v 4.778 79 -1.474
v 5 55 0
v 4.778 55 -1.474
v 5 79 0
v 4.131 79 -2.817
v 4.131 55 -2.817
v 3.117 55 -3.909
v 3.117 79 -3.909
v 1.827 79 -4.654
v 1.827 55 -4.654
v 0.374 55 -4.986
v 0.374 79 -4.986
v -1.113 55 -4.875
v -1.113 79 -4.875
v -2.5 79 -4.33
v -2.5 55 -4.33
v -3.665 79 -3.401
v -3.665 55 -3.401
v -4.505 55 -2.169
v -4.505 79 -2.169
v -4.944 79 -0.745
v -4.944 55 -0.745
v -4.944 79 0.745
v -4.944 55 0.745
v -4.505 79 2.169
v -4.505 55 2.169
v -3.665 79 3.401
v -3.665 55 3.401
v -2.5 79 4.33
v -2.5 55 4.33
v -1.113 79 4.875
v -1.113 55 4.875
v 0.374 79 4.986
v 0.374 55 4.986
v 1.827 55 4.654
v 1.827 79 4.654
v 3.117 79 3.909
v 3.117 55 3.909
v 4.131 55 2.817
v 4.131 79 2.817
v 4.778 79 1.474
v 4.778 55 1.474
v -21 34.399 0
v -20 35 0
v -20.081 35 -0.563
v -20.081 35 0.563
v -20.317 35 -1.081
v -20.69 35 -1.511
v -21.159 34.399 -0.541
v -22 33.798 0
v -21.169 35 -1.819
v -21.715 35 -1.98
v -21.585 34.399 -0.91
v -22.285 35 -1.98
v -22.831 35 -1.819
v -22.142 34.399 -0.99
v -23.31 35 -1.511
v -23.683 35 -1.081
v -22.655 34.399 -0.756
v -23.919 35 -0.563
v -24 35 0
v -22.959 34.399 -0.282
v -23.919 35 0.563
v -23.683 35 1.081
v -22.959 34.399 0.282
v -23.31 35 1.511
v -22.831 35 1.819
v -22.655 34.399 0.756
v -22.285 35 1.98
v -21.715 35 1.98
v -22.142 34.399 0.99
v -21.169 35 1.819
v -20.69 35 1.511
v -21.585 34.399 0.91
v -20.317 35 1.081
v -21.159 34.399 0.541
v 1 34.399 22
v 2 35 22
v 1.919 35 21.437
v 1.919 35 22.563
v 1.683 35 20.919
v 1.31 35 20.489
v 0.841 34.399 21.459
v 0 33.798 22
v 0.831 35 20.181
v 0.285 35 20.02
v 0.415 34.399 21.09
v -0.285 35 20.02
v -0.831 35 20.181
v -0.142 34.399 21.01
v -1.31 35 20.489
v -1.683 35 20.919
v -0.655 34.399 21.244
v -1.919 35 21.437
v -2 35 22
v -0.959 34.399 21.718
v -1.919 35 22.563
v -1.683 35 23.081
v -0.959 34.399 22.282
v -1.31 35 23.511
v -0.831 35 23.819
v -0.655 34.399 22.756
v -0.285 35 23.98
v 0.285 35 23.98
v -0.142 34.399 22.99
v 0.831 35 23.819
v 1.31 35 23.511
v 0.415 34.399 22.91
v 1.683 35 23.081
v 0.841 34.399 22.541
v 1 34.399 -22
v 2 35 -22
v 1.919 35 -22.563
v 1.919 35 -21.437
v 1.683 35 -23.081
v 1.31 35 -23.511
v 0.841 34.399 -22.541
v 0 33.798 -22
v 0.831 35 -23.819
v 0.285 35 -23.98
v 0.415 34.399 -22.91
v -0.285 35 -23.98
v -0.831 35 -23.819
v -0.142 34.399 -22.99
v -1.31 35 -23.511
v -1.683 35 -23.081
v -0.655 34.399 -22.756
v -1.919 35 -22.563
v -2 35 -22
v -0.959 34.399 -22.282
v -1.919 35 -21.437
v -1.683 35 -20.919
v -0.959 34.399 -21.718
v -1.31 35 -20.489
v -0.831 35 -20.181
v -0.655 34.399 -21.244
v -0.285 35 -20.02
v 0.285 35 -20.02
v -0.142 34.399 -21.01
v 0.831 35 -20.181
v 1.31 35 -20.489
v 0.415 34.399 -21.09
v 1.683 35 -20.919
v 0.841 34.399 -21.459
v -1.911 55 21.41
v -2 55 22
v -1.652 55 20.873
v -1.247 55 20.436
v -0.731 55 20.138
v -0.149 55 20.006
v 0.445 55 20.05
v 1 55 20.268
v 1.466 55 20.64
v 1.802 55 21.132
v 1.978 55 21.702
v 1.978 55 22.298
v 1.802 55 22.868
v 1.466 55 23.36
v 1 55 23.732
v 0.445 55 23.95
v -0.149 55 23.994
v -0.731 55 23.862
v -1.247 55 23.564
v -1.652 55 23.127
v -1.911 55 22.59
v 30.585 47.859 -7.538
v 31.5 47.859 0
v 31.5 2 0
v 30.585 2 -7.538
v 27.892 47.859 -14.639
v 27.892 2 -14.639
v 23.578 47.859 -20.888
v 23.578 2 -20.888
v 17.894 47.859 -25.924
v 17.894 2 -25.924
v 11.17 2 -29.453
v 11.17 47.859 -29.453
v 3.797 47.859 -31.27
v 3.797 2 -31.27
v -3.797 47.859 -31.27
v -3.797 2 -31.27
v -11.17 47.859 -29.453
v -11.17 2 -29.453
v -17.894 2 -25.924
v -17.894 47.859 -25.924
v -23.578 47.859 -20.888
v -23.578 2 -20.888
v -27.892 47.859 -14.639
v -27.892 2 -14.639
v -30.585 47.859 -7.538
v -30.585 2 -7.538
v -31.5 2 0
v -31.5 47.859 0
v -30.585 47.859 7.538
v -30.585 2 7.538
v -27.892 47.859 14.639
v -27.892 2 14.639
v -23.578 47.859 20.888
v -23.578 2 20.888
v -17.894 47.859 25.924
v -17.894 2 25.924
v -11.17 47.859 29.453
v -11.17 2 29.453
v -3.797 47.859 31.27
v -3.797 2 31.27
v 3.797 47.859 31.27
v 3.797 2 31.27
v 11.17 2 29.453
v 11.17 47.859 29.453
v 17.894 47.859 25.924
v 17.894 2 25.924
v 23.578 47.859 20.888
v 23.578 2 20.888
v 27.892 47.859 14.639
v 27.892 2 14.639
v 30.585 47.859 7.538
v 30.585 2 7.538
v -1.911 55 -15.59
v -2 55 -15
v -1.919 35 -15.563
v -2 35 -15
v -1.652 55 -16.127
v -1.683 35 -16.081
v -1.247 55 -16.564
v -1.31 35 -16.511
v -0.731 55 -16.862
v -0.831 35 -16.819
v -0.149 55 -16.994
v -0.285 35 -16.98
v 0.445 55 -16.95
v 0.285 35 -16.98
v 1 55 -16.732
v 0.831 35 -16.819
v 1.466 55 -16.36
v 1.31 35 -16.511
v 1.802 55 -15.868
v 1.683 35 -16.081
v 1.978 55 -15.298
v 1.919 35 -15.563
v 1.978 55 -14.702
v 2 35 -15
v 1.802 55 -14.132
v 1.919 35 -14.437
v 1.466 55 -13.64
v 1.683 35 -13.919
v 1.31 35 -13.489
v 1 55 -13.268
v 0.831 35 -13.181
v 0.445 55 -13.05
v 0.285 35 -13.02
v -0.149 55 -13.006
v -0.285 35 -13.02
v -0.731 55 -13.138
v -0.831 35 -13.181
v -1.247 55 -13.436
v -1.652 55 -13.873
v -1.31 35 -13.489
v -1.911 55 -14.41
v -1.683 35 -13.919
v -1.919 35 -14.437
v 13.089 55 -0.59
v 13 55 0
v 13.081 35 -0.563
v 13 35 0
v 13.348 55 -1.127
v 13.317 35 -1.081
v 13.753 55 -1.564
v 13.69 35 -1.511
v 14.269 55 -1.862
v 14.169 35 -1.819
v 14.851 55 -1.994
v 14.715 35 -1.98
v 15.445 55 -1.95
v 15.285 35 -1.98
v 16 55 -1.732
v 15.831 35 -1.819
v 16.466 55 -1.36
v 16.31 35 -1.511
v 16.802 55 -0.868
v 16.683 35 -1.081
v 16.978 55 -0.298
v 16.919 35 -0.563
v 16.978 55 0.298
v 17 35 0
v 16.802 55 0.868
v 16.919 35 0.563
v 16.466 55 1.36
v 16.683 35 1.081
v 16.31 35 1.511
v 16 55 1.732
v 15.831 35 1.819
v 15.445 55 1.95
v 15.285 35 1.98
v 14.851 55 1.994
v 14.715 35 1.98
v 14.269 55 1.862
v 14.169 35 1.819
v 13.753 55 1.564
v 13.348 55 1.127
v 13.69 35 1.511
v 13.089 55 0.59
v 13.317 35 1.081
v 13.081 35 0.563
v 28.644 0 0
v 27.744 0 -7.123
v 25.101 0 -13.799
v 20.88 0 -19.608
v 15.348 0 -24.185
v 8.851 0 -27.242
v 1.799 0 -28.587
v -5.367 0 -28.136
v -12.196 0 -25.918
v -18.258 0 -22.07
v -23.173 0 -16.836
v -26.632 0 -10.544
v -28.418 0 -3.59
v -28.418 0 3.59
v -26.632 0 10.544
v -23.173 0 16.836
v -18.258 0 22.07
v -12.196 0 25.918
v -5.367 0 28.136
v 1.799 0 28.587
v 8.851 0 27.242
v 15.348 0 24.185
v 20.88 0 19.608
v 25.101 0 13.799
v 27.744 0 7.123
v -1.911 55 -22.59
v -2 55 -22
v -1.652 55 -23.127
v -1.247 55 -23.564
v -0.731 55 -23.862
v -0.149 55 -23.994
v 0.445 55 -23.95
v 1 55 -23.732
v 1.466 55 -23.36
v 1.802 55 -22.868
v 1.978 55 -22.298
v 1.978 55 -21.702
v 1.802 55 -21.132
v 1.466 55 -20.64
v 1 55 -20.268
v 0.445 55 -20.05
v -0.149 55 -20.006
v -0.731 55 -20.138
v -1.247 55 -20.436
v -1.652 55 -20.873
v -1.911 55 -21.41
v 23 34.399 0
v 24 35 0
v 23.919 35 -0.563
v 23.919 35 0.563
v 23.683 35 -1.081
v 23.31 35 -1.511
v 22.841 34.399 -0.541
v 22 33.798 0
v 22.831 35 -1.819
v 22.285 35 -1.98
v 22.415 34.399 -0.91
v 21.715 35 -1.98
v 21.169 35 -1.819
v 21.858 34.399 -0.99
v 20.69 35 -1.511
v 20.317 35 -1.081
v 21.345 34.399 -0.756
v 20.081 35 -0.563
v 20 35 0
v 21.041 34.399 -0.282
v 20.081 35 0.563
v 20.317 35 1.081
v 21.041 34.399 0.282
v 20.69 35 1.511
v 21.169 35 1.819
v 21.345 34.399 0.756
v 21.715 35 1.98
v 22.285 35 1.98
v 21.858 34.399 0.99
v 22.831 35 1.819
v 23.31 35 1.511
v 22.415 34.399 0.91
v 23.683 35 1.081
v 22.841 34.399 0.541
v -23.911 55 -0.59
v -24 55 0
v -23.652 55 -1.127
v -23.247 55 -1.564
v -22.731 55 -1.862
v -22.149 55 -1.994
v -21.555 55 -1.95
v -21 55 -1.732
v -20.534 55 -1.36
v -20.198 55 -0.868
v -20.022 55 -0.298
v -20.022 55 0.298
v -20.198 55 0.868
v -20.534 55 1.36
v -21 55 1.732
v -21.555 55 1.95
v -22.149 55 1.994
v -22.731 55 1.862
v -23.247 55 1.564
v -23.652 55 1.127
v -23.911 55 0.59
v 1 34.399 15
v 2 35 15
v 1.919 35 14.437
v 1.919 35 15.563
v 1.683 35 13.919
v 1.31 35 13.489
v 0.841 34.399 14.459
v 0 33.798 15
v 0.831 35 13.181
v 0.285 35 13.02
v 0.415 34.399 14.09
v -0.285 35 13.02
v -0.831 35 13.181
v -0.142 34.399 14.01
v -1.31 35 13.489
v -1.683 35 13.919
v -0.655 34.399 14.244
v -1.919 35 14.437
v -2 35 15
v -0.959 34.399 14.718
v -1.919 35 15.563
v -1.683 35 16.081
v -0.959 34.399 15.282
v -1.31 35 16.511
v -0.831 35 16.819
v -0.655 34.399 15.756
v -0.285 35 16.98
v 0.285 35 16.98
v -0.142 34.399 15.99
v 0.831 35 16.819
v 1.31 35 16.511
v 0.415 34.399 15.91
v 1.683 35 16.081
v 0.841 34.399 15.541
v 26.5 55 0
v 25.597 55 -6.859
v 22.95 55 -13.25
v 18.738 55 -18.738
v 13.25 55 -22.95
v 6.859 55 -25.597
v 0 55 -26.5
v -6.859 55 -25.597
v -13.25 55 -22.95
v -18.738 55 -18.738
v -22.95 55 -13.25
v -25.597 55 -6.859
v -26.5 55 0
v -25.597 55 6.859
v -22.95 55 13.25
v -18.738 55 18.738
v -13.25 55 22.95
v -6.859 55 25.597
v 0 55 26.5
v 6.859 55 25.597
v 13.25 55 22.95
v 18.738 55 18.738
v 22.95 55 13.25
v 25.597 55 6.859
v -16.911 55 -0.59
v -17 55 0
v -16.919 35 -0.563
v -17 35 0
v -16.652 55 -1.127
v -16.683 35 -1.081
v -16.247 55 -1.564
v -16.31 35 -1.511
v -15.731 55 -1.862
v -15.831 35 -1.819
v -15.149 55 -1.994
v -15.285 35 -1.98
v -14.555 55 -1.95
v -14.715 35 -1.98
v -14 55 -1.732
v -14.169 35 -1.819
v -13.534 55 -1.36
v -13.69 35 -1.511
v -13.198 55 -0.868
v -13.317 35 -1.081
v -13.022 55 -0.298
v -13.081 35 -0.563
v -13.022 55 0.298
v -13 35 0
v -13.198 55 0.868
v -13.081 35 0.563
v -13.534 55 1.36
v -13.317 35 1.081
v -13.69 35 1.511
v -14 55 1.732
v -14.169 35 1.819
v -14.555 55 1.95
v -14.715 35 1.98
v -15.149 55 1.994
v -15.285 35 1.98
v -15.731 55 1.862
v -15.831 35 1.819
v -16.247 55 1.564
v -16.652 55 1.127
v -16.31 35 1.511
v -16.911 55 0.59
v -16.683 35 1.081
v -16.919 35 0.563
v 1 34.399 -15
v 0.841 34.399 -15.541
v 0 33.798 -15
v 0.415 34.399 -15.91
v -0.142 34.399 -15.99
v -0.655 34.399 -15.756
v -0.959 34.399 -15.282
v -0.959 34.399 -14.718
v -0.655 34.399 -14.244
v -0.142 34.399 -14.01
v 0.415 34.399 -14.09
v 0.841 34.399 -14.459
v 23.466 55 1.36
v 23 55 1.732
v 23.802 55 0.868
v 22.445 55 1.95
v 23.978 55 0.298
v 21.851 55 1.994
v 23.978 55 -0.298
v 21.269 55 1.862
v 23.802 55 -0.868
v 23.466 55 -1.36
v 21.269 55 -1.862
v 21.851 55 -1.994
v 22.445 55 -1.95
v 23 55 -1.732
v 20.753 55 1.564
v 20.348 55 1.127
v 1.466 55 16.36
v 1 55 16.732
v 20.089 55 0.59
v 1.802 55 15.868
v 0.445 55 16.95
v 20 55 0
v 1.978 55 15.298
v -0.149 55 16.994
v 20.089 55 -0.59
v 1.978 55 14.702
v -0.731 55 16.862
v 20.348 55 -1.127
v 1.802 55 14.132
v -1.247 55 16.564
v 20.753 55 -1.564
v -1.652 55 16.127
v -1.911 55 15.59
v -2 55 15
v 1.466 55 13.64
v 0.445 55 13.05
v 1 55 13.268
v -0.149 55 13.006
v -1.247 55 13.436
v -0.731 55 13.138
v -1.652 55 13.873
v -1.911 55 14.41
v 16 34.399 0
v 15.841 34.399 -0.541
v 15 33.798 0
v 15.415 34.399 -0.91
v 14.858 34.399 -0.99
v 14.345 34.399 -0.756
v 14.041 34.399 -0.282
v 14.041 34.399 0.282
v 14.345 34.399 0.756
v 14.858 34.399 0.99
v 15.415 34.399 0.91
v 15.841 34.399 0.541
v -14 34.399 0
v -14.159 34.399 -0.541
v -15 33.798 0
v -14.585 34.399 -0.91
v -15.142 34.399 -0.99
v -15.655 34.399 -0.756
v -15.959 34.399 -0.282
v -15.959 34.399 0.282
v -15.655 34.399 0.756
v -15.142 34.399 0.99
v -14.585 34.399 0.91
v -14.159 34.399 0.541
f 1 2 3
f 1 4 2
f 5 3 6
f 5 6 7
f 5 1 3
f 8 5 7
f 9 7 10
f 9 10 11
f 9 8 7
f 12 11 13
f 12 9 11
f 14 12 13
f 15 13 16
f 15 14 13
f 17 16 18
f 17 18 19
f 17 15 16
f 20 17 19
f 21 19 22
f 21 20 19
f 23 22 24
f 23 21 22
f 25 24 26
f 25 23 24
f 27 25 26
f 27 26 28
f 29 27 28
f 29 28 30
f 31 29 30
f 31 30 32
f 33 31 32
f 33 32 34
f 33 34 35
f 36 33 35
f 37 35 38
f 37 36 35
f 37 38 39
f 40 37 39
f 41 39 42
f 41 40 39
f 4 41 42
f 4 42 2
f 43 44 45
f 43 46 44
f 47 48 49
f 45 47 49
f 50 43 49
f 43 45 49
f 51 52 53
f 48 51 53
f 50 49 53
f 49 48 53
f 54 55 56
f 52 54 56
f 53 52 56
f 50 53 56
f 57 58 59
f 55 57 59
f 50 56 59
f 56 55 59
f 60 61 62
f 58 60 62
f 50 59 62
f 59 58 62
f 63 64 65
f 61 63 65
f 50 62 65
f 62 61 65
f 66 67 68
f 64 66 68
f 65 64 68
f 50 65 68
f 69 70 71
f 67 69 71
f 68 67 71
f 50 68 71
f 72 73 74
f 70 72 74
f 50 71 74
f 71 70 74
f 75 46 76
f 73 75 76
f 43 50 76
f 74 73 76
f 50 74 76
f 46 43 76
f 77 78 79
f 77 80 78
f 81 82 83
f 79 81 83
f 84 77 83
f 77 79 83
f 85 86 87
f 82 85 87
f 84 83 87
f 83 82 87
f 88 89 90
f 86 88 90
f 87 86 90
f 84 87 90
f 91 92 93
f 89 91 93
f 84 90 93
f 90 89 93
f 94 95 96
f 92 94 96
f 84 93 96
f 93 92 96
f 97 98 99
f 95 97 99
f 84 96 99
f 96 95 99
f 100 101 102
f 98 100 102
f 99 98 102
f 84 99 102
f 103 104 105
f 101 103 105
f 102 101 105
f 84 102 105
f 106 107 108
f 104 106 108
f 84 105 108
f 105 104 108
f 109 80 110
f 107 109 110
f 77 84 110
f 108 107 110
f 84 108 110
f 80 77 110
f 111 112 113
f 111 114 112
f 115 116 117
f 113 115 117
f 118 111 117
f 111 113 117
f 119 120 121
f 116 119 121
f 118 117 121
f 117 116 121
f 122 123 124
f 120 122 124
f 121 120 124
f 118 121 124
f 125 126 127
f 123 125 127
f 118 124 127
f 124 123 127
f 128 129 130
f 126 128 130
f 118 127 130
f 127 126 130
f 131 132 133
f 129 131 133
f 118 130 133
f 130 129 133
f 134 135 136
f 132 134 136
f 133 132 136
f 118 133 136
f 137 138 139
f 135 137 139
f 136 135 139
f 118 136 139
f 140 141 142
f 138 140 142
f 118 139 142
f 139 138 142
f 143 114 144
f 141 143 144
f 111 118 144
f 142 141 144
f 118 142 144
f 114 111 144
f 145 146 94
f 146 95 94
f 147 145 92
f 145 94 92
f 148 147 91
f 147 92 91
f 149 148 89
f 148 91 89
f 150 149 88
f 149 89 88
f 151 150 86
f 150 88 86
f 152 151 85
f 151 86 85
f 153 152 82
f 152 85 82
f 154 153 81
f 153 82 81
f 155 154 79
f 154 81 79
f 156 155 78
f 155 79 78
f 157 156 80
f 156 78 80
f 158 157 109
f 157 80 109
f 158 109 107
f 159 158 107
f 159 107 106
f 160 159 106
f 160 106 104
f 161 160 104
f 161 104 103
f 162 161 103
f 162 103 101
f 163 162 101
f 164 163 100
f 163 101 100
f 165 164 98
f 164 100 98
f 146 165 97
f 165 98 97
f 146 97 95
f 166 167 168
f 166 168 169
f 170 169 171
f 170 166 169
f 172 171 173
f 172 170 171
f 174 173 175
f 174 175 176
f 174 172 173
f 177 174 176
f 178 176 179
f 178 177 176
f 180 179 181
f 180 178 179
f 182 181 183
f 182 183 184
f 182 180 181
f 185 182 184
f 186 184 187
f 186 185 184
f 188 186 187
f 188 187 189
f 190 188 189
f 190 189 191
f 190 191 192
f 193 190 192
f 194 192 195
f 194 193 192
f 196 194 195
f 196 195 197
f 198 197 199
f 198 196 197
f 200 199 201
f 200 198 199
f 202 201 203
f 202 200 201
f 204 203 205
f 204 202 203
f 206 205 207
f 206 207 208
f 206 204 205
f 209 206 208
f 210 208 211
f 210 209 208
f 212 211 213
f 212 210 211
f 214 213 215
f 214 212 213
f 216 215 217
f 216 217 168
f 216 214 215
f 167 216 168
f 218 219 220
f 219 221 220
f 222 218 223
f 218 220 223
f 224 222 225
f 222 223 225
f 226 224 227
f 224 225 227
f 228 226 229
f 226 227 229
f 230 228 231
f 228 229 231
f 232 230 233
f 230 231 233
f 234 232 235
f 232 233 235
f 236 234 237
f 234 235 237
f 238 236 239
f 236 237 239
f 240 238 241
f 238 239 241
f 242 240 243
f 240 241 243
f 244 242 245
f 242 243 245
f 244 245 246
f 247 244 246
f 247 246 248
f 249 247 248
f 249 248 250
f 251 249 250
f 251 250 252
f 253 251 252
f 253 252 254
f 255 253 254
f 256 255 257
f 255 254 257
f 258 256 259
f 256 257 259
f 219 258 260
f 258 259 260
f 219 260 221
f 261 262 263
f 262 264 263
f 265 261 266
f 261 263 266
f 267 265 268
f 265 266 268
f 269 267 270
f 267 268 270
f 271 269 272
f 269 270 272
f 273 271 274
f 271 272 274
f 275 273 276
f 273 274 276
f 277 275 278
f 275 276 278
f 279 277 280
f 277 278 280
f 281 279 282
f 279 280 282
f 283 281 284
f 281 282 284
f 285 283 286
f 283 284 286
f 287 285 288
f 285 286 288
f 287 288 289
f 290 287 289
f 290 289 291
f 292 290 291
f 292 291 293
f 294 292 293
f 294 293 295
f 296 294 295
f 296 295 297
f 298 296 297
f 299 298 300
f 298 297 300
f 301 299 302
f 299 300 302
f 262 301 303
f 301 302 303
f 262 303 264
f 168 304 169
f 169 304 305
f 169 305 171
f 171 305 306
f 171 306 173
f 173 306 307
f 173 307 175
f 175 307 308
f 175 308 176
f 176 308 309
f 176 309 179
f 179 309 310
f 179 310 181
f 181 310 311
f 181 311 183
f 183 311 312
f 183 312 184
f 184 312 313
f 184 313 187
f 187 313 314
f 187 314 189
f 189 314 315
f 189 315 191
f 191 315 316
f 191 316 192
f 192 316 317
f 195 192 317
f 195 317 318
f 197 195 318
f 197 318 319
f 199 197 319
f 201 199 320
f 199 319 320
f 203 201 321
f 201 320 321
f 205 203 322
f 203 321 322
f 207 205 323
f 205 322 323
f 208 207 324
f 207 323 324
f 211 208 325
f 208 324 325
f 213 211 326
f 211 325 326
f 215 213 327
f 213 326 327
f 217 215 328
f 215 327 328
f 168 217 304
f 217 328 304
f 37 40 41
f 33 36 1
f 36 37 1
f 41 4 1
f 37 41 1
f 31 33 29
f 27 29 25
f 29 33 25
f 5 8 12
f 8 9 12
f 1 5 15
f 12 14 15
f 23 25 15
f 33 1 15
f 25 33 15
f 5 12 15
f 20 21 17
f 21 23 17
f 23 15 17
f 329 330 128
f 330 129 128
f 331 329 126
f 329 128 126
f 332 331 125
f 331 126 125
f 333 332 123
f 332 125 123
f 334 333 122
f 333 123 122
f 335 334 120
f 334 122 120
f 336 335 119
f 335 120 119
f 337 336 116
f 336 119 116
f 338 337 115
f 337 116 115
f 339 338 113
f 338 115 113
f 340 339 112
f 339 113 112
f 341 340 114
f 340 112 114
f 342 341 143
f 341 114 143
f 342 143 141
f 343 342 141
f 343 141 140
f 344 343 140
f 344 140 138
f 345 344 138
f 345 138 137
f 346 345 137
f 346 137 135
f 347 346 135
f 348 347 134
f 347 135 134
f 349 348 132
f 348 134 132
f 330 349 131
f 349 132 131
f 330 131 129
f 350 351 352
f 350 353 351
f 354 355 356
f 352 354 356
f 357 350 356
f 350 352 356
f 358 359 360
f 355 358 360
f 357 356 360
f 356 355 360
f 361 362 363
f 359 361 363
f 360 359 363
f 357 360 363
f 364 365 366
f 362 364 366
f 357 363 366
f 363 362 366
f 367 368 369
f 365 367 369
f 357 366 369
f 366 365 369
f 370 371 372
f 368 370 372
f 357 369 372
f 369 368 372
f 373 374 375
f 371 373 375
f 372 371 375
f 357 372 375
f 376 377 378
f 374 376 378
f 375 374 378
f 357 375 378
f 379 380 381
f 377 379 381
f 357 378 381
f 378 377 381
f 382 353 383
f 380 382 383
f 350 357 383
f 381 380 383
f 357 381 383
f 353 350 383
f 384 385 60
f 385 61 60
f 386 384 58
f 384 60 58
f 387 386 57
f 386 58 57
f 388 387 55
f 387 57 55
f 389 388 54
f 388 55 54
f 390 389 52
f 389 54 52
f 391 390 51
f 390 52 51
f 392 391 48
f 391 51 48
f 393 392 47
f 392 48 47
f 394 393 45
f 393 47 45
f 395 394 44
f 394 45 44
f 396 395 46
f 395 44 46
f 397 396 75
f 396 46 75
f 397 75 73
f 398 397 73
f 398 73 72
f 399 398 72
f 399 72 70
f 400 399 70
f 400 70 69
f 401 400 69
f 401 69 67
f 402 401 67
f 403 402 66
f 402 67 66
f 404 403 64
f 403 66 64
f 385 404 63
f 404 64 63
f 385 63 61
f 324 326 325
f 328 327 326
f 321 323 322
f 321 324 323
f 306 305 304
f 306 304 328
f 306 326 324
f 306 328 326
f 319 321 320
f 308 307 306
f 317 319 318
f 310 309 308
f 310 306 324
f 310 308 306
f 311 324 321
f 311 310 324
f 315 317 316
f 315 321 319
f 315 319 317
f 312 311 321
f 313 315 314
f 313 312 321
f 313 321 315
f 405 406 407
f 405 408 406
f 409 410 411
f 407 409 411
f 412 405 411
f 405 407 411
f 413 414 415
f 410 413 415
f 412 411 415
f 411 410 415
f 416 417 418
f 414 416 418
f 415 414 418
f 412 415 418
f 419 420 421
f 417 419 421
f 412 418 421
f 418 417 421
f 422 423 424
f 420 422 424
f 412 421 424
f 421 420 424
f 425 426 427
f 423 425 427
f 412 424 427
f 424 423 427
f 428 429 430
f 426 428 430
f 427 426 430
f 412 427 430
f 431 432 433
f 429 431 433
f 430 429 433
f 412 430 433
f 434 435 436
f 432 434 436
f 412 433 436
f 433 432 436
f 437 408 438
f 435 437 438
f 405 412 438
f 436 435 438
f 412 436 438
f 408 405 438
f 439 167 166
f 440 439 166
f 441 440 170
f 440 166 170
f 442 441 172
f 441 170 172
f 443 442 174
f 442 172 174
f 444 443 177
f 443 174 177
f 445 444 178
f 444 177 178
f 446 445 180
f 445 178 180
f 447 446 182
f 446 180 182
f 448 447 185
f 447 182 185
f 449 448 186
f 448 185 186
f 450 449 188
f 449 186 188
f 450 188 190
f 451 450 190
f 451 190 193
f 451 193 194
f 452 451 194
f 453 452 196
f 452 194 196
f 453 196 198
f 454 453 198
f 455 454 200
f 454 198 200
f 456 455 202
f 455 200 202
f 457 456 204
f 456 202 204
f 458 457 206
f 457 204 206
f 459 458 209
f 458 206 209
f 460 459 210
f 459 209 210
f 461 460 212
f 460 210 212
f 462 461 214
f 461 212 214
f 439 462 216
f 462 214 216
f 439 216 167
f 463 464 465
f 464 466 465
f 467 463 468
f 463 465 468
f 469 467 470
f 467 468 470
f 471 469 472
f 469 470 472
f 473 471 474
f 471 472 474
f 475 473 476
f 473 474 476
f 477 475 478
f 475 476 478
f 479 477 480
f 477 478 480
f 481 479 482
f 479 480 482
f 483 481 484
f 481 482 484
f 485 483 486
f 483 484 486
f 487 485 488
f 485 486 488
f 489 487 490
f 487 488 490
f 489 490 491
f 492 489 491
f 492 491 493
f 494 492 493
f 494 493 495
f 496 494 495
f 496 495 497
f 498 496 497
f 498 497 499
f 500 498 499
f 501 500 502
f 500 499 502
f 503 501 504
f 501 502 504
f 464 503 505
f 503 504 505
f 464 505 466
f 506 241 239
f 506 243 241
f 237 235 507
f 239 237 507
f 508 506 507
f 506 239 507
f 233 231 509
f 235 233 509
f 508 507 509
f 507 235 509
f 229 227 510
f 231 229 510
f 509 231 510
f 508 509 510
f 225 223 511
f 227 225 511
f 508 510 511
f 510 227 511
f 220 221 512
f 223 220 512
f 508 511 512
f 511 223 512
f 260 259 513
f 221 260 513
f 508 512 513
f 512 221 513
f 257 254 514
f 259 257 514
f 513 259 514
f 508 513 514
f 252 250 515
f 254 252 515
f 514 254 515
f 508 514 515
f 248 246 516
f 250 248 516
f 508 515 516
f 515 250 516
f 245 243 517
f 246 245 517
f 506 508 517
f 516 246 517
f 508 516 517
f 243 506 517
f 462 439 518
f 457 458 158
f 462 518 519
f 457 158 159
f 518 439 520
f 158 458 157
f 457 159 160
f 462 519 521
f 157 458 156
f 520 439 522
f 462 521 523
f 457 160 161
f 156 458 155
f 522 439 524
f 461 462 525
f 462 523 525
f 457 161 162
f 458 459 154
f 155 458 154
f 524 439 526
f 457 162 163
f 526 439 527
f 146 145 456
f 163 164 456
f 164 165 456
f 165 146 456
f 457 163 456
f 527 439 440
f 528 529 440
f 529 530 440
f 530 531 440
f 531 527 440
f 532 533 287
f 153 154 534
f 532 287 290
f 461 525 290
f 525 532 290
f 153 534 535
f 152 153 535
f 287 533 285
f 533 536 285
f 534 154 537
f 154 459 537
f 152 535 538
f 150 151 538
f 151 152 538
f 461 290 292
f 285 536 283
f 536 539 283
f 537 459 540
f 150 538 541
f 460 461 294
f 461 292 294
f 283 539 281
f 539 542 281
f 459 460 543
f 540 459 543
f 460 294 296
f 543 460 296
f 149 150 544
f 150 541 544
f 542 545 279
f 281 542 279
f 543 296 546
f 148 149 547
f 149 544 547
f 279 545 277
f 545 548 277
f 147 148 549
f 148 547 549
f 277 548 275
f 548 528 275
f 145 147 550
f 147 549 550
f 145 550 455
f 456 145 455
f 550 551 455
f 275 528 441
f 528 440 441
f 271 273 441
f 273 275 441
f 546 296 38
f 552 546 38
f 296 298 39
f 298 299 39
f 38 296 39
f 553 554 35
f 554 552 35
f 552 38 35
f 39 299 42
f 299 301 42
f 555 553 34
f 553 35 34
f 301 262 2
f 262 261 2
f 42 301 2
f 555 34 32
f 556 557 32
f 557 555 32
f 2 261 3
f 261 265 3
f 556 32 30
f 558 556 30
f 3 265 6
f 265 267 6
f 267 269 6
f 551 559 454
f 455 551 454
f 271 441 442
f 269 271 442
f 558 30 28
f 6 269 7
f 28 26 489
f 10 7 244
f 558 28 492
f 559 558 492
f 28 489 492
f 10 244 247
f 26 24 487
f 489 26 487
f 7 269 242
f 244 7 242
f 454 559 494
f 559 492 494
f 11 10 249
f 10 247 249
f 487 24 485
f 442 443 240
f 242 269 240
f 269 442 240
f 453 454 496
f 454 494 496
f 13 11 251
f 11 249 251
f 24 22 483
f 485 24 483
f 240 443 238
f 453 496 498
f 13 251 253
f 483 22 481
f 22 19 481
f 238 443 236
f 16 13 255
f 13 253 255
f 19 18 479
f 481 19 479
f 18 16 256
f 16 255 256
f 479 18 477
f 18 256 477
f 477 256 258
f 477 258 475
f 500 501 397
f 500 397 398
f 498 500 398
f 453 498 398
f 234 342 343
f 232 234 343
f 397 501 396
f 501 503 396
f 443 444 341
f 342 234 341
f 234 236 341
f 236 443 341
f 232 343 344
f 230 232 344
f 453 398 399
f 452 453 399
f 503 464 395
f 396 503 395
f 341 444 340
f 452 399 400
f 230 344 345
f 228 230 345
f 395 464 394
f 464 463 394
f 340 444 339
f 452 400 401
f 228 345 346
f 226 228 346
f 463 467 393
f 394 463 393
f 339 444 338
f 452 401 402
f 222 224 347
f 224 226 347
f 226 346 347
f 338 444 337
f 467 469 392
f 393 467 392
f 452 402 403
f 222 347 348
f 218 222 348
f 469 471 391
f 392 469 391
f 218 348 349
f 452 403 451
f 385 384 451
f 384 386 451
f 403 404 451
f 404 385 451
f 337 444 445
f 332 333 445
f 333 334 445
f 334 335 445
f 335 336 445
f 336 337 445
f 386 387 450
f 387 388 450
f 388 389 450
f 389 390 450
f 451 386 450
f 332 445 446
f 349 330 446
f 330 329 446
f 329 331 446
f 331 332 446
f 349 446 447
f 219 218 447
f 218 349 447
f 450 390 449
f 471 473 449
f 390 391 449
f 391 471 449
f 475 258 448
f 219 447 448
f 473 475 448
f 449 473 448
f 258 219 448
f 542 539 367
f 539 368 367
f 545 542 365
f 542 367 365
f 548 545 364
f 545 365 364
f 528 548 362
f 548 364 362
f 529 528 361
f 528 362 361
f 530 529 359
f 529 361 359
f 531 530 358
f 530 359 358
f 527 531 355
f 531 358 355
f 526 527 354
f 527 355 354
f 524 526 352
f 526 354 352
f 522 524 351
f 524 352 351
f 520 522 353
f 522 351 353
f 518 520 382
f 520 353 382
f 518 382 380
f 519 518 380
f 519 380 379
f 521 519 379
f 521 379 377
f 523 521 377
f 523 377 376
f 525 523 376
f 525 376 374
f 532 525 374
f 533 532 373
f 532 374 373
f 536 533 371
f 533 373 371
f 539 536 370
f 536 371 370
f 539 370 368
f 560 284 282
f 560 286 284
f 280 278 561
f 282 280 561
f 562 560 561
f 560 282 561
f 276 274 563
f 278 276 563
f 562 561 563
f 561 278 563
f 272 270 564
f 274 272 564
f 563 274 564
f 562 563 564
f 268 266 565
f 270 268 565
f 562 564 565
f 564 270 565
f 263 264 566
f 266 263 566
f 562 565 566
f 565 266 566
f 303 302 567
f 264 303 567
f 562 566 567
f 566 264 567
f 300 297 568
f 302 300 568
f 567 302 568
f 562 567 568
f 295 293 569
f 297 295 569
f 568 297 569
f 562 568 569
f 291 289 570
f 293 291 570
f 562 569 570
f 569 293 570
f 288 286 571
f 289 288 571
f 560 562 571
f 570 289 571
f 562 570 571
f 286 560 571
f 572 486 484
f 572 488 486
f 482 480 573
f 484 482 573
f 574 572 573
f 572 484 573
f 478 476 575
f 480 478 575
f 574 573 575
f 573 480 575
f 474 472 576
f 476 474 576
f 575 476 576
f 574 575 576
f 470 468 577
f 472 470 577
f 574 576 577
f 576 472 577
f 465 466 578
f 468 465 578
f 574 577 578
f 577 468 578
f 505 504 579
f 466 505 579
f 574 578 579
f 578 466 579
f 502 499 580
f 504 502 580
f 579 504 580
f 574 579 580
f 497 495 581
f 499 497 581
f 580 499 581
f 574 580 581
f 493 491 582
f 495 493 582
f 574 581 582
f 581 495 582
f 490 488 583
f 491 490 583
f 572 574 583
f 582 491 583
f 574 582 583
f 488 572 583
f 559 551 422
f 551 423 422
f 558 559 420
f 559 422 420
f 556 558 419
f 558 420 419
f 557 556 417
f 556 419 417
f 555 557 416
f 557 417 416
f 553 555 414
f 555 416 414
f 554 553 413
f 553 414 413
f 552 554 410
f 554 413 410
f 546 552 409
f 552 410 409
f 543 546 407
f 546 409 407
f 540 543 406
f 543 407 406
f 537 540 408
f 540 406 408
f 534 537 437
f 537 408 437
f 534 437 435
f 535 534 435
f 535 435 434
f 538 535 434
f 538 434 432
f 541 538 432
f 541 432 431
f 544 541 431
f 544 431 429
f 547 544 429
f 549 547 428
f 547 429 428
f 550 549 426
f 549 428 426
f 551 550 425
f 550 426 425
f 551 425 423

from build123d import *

# Parameters (mm, degrees)
SKETCH1_W                 = 31.5
SKETCH1_H                 = 55
SKETCH1_W_2               = 5
SKETCH1_H_2               = 24
CHAMFER1_SIZE             = 5
CHAMFER1_SIZE2            = 7.140740034
CHAMFER2_SIZE             = 2
CHAMFER2_SIZE2            = 2.856296013
F_4_0MM_DOWEL_HOLE1_D     = 4
F_4_0MM_DOWEL_HOLE1_DEPTH = 20
F_4_0MM_DOWEL_HOLE1_TIP   = 1.201721238


with BuildPart() as part:
    # Sketch1 → Revolve1 (revolve)
    with BuildSketch(Plane.XY):
        with Locations((15.75, 27.5)):
            Rectangle(SKETCH1_W, SKETCH1_H)
        with Locations((2.5, 67)):
            Rectangle(SKETCH1_W_2, SKETCH1_H_2)
    revolve(axis=Axis((0, 55, 0), (0, 1, 0)))

    # Chamfer1
    chamfer1_edges = [part.edges().sort_by_distance(p)[0] for p in [
        (-31.5, 55, 0),
    ]]
    chamfer1_side = [part.faces().sort_by_distance(p)[0] for p in [
        (-30.609045456, 55, 0),
    ]]
    chamfer(chamfer1_edges, length=CHAMFER1_SIZE, length2=CHAMFER1_SIZE2, reference=chamfer1_side[0])

    # Chamfer2
    chamfer2_edges = [part.edges().sort_by_distance(p)[0] for p in [
        (-31.5, 0, 0),
    ]]
    chamfer2_side = [part.faces().sort_by_distance(p)[0] for p in [
        (-31.5, 23.929629983, 0),
    ]]
    chamfer(chamfer2_edges, length=CHAMFER2_SIZE, length2=CHAMFER2_SIZE2, reference=chamfer2_side[0])

    # Ø4.0mm Dowel Hole1
    with Locations(Plane(origin=(0, 55, 0), x_dir=(1, 0, 0), z_dir=(0, 1, 0))):
        with Locations((15, 0), (0, 22), (22, 0), (0, -22), (-22, 0), (0, 15), (-15, 0), (0, -15)):
            Hole(F_4_0MM_DOWEL_HOLE1_D / 2, depth=F_4_0MM_DOWEL_HOLE1_DEPTH)
            with Locations((0, 0, -(F_4_0MM_DOWEL_HOLE1_DEPTH + F_4_0MM_DOWEL_HOLE1_TIP / 2))):  # 118° drill point
                Cone(0, F_4_0MM_DOWEL_HOLE1_D / 2, F_4_0MM_DOWEL_HOLE1_TIP, mode=Mode.SUBTRACT)


solid = part.part
